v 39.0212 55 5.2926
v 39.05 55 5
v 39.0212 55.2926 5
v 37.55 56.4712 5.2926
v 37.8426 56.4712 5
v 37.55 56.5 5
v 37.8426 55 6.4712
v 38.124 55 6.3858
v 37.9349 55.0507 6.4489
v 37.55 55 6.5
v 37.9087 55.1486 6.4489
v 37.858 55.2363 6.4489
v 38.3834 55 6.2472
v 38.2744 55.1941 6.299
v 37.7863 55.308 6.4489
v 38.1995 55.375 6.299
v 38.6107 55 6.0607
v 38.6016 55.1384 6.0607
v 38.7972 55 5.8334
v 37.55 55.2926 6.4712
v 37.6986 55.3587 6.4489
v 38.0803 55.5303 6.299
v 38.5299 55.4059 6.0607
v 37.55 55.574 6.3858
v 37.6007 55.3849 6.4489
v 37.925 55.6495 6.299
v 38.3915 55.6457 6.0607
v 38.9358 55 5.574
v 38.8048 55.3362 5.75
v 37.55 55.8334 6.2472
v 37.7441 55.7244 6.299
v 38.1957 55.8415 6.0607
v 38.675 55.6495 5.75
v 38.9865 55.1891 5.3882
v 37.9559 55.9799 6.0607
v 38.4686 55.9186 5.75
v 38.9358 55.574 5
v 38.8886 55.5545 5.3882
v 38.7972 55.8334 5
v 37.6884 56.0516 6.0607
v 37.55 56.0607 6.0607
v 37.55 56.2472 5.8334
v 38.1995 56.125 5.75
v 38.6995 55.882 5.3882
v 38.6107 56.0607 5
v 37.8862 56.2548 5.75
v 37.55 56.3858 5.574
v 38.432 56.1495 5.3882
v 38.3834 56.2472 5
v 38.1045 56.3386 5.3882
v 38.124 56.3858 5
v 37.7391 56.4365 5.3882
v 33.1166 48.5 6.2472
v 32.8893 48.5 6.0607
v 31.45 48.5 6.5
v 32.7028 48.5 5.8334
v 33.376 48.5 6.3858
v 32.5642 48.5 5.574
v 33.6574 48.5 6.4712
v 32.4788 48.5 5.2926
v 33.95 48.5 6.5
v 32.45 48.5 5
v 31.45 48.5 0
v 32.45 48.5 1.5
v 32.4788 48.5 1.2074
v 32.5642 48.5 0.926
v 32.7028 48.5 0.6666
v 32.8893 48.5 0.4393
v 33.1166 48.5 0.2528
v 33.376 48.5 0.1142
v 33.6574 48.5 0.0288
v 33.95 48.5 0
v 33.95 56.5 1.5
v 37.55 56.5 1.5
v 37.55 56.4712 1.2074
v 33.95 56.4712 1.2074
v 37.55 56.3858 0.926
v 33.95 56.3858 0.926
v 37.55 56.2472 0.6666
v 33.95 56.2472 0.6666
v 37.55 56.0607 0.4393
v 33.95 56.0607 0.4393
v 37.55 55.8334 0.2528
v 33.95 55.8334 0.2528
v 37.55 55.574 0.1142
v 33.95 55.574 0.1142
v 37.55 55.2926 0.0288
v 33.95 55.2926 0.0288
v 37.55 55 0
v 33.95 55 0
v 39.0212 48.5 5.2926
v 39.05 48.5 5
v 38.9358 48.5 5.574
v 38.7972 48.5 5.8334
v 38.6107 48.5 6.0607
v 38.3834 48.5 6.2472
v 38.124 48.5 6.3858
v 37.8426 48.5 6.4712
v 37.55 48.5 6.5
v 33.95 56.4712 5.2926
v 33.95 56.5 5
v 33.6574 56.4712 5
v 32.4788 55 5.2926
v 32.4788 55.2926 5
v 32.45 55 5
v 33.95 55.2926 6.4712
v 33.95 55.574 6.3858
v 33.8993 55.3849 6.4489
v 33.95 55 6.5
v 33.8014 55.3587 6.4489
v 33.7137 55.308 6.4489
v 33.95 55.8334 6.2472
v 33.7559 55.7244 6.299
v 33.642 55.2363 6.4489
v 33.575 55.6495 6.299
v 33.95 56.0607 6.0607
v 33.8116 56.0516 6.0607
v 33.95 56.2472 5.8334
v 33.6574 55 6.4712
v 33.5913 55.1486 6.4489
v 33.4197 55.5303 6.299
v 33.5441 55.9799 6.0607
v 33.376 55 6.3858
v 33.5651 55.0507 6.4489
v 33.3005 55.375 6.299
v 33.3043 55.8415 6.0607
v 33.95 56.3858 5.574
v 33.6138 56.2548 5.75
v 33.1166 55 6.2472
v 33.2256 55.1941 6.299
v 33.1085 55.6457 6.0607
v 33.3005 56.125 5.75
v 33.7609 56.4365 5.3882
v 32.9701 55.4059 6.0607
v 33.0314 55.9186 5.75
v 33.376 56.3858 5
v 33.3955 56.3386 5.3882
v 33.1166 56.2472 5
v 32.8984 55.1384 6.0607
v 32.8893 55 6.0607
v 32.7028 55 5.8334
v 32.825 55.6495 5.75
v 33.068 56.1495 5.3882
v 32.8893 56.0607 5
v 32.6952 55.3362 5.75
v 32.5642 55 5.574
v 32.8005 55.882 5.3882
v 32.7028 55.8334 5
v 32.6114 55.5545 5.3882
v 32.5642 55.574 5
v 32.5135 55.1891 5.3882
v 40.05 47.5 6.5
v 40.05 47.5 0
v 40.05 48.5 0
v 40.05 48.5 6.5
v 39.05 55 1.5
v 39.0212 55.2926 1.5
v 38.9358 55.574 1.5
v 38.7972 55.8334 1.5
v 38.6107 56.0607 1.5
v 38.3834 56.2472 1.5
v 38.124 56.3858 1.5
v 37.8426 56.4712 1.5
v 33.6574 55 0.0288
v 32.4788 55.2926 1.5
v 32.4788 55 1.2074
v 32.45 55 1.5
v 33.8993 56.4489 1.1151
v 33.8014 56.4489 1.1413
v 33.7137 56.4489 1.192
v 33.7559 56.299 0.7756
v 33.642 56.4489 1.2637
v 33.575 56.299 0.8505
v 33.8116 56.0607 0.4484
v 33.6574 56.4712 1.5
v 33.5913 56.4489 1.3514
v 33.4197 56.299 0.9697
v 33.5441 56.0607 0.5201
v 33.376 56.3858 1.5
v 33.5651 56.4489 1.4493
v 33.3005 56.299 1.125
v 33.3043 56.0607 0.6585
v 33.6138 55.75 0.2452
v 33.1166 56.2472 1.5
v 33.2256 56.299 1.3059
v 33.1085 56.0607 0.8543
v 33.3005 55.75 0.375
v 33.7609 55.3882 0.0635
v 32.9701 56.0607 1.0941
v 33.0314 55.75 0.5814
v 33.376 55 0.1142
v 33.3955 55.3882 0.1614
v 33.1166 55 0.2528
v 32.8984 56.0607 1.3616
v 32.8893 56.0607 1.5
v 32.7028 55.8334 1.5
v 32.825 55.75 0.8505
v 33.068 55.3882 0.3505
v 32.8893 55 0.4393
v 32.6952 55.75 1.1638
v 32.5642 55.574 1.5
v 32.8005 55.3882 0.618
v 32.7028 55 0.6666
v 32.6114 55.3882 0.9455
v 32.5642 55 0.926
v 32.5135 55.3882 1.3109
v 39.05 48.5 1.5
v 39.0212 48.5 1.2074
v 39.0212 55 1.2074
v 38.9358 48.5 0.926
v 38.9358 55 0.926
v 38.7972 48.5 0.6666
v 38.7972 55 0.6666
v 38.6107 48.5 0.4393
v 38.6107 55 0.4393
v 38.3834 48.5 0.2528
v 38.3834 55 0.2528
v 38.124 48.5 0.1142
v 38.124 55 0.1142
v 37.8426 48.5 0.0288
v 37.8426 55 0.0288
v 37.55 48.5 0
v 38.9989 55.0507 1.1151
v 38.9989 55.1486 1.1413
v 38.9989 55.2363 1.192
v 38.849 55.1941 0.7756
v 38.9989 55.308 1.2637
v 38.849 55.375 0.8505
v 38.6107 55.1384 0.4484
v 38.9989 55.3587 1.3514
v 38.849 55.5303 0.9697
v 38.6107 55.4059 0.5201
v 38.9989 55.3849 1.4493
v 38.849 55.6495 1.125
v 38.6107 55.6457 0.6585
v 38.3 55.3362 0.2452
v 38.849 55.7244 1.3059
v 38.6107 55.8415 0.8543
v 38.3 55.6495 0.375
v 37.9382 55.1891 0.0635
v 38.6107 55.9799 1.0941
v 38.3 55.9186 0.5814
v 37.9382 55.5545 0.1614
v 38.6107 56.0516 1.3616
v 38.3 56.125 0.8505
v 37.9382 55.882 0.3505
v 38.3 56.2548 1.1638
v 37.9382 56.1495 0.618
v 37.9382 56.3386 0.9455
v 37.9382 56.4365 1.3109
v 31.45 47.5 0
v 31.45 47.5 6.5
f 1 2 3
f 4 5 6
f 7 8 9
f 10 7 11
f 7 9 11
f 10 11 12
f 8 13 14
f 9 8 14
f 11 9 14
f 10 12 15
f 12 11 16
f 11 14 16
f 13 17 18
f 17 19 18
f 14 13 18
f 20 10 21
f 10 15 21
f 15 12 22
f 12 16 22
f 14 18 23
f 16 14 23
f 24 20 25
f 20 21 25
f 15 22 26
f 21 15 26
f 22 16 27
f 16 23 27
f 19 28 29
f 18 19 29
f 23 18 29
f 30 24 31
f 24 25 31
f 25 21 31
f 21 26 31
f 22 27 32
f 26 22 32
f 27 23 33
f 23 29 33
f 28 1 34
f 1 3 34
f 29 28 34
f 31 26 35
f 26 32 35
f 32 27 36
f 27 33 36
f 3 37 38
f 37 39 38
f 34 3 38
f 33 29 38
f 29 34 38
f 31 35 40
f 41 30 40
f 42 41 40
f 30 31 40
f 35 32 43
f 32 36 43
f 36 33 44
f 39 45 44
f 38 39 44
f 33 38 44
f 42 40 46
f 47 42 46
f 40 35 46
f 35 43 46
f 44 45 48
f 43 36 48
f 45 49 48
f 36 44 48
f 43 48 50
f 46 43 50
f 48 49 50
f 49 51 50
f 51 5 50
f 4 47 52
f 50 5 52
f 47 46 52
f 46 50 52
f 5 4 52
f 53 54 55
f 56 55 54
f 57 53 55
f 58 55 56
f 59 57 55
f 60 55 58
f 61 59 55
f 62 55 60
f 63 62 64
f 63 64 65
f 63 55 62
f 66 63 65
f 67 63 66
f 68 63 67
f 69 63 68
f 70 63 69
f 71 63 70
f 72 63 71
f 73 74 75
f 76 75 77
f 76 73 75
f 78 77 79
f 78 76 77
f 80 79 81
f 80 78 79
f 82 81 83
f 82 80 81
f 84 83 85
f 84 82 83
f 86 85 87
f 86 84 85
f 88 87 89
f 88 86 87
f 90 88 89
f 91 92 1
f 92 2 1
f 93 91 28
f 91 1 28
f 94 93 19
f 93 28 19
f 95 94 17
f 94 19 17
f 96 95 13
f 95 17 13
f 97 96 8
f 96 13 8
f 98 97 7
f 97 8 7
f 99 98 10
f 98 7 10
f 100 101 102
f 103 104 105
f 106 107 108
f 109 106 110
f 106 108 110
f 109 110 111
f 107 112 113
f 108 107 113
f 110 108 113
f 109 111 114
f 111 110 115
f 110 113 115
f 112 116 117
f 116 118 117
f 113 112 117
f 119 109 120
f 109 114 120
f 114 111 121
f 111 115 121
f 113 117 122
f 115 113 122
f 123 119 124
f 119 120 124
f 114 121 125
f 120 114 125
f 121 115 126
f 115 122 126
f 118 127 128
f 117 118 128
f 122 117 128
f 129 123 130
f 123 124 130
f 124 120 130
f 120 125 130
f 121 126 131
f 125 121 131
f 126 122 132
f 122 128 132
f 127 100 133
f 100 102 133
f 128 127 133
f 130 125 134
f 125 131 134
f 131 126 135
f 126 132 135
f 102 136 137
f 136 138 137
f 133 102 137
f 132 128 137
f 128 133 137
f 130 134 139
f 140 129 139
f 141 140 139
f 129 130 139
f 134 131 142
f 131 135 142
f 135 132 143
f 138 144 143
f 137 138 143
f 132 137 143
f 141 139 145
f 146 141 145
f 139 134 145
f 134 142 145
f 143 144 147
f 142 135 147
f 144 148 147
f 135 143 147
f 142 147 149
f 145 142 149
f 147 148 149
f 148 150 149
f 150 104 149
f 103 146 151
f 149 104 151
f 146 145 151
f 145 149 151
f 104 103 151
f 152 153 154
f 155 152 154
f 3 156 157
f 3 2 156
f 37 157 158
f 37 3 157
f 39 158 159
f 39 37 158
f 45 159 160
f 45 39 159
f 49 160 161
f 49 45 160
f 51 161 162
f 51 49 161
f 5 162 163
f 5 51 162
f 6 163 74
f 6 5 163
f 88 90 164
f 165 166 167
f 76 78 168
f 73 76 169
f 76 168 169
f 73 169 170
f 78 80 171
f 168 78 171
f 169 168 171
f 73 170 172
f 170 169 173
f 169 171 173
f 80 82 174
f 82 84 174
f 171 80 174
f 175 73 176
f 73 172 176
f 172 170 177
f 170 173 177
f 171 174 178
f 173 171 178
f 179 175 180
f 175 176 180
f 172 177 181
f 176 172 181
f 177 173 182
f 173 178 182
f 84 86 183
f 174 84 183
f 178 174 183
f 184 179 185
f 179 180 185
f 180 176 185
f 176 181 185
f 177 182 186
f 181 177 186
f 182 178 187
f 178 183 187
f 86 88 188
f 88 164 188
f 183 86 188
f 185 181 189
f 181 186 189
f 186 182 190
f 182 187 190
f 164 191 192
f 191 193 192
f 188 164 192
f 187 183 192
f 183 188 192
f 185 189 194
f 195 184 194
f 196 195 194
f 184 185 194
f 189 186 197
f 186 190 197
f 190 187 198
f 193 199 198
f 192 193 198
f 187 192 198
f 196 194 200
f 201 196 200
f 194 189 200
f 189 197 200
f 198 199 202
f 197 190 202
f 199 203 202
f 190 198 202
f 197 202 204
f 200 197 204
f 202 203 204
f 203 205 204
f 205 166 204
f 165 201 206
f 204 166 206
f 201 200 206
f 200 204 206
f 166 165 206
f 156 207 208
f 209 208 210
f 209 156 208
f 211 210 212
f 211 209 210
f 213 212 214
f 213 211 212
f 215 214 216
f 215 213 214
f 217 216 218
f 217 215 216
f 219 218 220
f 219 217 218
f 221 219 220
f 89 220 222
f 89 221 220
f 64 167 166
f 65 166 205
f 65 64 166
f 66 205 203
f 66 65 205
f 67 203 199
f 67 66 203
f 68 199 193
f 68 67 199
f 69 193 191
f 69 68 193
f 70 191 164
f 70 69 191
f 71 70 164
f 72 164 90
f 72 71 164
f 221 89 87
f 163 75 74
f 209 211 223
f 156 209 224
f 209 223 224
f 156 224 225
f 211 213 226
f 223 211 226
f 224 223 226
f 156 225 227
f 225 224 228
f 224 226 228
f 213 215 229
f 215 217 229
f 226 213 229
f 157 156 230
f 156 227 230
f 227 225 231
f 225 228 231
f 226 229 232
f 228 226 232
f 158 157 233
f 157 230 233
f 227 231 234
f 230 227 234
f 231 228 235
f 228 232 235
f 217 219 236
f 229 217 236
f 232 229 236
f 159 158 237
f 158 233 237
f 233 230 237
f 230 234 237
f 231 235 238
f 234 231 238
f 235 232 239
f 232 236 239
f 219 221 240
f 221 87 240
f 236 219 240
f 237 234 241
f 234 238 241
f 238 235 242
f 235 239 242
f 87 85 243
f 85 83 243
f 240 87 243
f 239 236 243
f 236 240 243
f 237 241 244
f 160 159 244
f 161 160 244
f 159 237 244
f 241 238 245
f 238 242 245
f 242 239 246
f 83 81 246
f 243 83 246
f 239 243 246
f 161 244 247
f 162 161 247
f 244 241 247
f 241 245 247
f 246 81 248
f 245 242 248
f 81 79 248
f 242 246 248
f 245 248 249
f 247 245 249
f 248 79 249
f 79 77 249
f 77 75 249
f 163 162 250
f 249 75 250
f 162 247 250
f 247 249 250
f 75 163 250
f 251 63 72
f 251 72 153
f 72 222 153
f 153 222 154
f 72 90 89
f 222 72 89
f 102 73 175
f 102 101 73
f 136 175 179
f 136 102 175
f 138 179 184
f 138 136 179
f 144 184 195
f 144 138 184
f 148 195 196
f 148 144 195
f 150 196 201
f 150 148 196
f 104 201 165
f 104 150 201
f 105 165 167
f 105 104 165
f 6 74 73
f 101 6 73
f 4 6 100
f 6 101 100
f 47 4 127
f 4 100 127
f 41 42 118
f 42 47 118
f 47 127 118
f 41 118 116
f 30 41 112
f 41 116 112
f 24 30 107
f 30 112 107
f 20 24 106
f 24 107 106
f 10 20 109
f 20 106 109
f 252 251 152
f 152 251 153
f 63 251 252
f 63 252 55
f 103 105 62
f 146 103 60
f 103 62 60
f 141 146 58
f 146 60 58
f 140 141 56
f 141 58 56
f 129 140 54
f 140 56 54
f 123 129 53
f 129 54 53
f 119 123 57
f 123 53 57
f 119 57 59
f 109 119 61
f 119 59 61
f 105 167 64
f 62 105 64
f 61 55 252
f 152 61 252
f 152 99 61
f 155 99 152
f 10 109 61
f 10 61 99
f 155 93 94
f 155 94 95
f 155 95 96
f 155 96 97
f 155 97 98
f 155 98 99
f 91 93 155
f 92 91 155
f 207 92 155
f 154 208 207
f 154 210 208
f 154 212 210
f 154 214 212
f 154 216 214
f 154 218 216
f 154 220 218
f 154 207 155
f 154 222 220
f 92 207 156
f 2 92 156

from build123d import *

# Parameters (mm, degrees)
SKETCH2_W           = 1
SKETCH2_H           = 1
BOSS_EXTRUDE1_DEPTH = 6.5
FILLET1_R           = 1.5


with BuildPart() as part:
    # Sketch2 → Boss-Extrude1 (new body)
    with BuildSketch(Plane.XY):
        with Locations((31.95, 48)):
            Rectangle(SKETCH2_W, SKETCH2_H)
        Polygon((35.75, 56.5), (32.45, 56.5), (32.45, 48.5), (32.45, 47.5), (35.75, 47.5), align=None)
        Polygon((39.05, 56.5), (35.75, 56.5), (35.75, 47.5), (39.05, 47.5), (39.05, 48.5), align=None)
        with Locations((39.55, 48)):
            Rectangle(SKETCH2_W, SKETCH2_H)
    extrude(amount=BOSS_EXTRUDE1_DEPTH)

    # Fillet1
    fillet1_edges = [part.edges().sort_by_distance(p)[0] for p in [
        (32.45, 52.5, 0),
        (35.75, 56.5, 0),
        (39.05, 52.5, 0),
        (32.45, 56.5, 3.25),
        (39.05, 56.5, 3.25),
        (39.05, 52.5, 6.5),
        (35.75, 56.5, 6.5),
        (32.45, 52.5, 6.5),
    ]]
    fillet(fillet1_edges, radius=FILLET1_R)


solid = part.part
